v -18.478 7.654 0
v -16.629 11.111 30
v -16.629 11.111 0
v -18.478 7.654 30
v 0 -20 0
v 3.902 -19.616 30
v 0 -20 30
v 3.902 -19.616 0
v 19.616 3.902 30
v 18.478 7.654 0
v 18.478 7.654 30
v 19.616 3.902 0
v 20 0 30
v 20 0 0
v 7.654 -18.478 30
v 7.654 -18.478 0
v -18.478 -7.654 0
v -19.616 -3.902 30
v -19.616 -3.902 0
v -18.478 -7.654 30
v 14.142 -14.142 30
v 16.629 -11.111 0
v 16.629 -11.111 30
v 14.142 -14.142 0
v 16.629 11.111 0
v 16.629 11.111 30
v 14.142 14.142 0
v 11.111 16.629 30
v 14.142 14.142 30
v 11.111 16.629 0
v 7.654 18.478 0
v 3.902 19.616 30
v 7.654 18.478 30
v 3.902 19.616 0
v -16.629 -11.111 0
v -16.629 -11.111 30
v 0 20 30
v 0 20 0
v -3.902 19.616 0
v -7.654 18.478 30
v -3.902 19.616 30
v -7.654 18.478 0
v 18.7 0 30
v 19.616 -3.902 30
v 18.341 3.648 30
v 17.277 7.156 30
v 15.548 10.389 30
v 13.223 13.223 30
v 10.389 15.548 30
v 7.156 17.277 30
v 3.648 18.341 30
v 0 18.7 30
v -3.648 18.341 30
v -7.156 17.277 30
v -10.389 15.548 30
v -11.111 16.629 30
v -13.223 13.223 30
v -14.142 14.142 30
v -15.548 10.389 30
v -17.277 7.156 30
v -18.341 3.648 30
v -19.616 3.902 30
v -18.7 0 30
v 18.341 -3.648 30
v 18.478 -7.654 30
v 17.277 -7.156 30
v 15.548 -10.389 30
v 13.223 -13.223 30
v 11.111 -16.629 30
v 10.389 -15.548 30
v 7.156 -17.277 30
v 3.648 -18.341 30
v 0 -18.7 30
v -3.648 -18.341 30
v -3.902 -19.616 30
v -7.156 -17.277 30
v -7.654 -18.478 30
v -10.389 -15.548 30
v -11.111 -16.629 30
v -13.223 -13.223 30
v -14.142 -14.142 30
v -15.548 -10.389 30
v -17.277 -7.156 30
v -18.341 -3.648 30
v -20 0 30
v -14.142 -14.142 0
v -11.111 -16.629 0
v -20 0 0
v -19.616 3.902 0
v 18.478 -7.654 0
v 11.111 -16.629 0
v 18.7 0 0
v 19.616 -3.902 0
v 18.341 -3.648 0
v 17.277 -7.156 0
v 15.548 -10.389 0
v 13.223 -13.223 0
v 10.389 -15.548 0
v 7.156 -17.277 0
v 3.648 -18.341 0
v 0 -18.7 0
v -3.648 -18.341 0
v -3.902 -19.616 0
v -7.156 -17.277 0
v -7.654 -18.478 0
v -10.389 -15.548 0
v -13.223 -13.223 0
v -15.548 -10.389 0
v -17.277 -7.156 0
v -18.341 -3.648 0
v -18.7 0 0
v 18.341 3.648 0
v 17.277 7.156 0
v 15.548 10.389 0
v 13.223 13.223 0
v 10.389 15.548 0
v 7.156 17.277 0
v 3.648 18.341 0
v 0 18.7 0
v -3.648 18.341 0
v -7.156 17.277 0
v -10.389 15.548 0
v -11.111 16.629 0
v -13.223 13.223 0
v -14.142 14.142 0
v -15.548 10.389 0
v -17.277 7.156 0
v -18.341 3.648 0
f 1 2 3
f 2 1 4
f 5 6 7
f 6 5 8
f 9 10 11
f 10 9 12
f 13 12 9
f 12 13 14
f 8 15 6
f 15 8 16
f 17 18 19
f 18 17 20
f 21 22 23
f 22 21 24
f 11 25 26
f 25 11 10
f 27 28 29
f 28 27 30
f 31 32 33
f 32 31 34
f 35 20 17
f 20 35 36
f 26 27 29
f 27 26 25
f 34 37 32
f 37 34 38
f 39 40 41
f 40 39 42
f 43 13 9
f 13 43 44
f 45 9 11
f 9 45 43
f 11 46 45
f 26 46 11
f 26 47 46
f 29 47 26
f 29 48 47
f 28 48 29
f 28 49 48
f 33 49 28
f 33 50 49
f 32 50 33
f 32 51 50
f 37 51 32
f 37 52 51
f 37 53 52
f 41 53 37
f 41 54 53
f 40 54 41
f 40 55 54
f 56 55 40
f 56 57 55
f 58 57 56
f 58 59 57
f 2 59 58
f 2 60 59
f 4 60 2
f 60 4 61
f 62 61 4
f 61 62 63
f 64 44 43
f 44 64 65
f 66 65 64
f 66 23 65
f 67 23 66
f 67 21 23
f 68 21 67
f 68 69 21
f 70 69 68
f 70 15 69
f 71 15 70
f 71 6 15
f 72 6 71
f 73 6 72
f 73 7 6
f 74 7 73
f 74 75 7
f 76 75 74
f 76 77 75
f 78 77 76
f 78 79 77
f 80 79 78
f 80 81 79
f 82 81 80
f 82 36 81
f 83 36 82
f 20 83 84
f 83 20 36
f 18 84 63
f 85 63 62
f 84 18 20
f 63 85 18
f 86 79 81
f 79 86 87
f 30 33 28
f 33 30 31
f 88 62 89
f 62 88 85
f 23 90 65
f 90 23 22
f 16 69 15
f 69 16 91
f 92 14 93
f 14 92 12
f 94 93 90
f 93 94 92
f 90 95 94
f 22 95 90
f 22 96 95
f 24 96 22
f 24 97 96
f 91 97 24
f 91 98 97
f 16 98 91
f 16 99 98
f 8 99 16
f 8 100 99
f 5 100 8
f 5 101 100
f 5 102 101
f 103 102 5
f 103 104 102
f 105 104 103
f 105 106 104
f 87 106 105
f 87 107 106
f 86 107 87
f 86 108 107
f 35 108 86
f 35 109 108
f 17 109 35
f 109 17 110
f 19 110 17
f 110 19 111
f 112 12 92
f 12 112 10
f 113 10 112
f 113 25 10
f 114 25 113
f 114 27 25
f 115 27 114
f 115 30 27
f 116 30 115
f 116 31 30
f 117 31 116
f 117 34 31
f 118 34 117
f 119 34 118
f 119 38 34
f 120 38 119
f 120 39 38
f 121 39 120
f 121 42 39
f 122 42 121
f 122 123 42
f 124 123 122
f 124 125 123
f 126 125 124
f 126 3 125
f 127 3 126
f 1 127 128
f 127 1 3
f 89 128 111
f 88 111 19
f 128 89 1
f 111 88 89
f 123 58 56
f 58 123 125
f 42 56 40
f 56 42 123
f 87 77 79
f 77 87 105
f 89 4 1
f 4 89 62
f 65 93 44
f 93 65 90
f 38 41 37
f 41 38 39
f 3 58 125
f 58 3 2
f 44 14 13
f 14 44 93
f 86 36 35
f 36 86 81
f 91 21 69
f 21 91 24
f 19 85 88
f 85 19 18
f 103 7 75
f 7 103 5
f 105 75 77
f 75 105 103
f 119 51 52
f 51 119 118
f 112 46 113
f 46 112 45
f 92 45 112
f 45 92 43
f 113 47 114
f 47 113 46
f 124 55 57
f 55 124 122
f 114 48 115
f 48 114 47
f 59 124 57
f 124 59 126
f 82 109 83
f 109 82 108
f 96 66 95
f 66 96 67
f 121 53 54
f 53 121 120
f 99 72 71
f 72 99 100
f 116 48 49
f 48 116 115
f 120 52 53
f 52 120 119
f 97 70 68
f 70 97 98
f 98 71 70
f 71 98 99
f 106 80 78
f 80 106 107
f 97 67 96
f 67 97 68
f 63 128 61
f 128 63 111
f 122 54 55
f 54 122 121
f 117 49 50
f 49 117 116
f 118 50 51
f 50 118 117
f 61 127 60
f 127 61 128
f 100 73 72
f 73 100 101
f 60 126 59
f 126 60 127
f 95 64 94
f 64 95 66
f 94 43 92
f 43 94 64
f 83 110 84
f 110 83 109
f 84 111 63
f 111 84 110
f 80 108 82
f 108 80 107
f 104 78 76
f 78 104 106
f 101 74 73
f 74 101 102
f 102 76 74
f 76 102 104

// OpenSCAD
$fn = 32;

// ----------------------------------------------------------------------
// Thin tube: 1.3 mm wall
// ----------------------------------------------------------------------

// --- parameters (mm) ---
tube_od = 40;             // outer diameter
tube_h = 30;              // height, Z
wall = 1.3;               // wall thickness

difference() {
  cylinder(h = tube_h, d = tube_od);
  translate([0, 0, -1]) cylinder(h = tube_h + 2, d = tube_od - 2 * wall);
}
